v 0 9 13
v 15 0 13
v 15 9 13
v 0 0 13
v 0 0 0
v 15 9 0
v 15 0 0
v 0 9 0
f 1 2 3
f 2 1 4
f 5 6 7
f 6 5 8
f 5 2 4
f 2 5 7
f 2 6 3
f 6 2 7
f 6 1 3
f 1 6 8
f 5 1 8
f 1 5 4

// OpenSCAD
// Generated by SolidPython 1.0.1 on 2020-07-29 00:46:55


cube(size = [15, 9, 13]);
/***********************************************
*********      SolidPython code:      **********
************************************************
 
# import packages: SolidPython
from solid import *
from solid.utils import *
from itertools import chain, combinations, permutations


class Resize:

    def __init__(self, scad_file):
        self.scad_file = scad_file
        #self.scad_file = import_scad(scad_file)
        # cone/cylinder param:
        self.r1 = 0
        self.r2 = 0
        self.h = 0
        # rectangular prism param:
        self.w = 0
        self.l = 0
        # ellipse param:
        self.r = 0

    # import OpenScad code (file name corresponds to shape)


    # classify shape + parameters
    def assign(self, param1, param2, param3):
        if self.scad_file == 'cone.scad':
            self.r1 = param1
            self.r2 = param2
            self.h = param3
        elif self.scad_file == 'cylinder.scad':
            self.r1 = param1
            self.r2 = param2
            self.h = param3
        elif self.scad_file == 'rectangularPrism.scad':
            self.h = param1
            self.l = param2
            self.w = param3
        else:
            self.r = param1
            self.h = param2

    # resize parameters
    def iterate(self):
        x = range(3, 20, 2)
        i = 1
        if self.scad_file == 'cone.scad':
            tempList = list(permutations(x, 2))
            for temp in tempList:
                param1 = temp[0]
                param2 = temp[1]
                filepath = 'produced_scad_files/' + 'cone' + str(param1) + '_' + str(param2) + '_' + '.scad'
                scad_render_to_file(cylinder(h=param1, r1=param2, r2=0), filepath)

        elif self.scad_file == 'cylinder.scad':
            tempList = list(permutations(x, 3))
            for temp in tempList:
                param1 = temp[0]
                param2 = temp[1]
                filepath = 'produced_scad_files/' + 'cylinder' + str(param1) + '_' + str(param2) + '_' + '.scad'
                scad_render_to_file(cylinder(h=param1, r1=param2, r2=param2), filepath)

        elif self.scad_file == 'rectangularPrism.scad':
            tempList = list(permutations(x, 3))
            for temp in tempList:
                param1 = temp[0]
                param2 = temp[1]
                param3 = temp[2]
                filepath = 'produced_scad_files/' + 'rectangularPrism' + str(param1) + '_' + str(param2) + '_' + str(
                    param3) + '.scad'
                scad_render_to_file(cube(size=(param1, param2, param3)), filepath)

        elif self.scad_file == 'ellipse.scad':
            tempList = list(permutations(x, 4))
            for temp in tempList:
                param1 = temp[0]
                param2 = temp[1]
                param3 = temp[2]
                param4 = temp[3]
                filepath = 'produced_scad_files/' + 'ellipse' + str(param1) + '_' + str(param2) + '_' + str(param3) + '_' + str(param4) + '.scad'
                scad_render_to_file(scale([param1, param2, param3])(sphere(r=param4)), filepath)

    def render_to_scadfile(self):
        scad_render_to_file(scad, 'example.scad') 
 
************************************************/
